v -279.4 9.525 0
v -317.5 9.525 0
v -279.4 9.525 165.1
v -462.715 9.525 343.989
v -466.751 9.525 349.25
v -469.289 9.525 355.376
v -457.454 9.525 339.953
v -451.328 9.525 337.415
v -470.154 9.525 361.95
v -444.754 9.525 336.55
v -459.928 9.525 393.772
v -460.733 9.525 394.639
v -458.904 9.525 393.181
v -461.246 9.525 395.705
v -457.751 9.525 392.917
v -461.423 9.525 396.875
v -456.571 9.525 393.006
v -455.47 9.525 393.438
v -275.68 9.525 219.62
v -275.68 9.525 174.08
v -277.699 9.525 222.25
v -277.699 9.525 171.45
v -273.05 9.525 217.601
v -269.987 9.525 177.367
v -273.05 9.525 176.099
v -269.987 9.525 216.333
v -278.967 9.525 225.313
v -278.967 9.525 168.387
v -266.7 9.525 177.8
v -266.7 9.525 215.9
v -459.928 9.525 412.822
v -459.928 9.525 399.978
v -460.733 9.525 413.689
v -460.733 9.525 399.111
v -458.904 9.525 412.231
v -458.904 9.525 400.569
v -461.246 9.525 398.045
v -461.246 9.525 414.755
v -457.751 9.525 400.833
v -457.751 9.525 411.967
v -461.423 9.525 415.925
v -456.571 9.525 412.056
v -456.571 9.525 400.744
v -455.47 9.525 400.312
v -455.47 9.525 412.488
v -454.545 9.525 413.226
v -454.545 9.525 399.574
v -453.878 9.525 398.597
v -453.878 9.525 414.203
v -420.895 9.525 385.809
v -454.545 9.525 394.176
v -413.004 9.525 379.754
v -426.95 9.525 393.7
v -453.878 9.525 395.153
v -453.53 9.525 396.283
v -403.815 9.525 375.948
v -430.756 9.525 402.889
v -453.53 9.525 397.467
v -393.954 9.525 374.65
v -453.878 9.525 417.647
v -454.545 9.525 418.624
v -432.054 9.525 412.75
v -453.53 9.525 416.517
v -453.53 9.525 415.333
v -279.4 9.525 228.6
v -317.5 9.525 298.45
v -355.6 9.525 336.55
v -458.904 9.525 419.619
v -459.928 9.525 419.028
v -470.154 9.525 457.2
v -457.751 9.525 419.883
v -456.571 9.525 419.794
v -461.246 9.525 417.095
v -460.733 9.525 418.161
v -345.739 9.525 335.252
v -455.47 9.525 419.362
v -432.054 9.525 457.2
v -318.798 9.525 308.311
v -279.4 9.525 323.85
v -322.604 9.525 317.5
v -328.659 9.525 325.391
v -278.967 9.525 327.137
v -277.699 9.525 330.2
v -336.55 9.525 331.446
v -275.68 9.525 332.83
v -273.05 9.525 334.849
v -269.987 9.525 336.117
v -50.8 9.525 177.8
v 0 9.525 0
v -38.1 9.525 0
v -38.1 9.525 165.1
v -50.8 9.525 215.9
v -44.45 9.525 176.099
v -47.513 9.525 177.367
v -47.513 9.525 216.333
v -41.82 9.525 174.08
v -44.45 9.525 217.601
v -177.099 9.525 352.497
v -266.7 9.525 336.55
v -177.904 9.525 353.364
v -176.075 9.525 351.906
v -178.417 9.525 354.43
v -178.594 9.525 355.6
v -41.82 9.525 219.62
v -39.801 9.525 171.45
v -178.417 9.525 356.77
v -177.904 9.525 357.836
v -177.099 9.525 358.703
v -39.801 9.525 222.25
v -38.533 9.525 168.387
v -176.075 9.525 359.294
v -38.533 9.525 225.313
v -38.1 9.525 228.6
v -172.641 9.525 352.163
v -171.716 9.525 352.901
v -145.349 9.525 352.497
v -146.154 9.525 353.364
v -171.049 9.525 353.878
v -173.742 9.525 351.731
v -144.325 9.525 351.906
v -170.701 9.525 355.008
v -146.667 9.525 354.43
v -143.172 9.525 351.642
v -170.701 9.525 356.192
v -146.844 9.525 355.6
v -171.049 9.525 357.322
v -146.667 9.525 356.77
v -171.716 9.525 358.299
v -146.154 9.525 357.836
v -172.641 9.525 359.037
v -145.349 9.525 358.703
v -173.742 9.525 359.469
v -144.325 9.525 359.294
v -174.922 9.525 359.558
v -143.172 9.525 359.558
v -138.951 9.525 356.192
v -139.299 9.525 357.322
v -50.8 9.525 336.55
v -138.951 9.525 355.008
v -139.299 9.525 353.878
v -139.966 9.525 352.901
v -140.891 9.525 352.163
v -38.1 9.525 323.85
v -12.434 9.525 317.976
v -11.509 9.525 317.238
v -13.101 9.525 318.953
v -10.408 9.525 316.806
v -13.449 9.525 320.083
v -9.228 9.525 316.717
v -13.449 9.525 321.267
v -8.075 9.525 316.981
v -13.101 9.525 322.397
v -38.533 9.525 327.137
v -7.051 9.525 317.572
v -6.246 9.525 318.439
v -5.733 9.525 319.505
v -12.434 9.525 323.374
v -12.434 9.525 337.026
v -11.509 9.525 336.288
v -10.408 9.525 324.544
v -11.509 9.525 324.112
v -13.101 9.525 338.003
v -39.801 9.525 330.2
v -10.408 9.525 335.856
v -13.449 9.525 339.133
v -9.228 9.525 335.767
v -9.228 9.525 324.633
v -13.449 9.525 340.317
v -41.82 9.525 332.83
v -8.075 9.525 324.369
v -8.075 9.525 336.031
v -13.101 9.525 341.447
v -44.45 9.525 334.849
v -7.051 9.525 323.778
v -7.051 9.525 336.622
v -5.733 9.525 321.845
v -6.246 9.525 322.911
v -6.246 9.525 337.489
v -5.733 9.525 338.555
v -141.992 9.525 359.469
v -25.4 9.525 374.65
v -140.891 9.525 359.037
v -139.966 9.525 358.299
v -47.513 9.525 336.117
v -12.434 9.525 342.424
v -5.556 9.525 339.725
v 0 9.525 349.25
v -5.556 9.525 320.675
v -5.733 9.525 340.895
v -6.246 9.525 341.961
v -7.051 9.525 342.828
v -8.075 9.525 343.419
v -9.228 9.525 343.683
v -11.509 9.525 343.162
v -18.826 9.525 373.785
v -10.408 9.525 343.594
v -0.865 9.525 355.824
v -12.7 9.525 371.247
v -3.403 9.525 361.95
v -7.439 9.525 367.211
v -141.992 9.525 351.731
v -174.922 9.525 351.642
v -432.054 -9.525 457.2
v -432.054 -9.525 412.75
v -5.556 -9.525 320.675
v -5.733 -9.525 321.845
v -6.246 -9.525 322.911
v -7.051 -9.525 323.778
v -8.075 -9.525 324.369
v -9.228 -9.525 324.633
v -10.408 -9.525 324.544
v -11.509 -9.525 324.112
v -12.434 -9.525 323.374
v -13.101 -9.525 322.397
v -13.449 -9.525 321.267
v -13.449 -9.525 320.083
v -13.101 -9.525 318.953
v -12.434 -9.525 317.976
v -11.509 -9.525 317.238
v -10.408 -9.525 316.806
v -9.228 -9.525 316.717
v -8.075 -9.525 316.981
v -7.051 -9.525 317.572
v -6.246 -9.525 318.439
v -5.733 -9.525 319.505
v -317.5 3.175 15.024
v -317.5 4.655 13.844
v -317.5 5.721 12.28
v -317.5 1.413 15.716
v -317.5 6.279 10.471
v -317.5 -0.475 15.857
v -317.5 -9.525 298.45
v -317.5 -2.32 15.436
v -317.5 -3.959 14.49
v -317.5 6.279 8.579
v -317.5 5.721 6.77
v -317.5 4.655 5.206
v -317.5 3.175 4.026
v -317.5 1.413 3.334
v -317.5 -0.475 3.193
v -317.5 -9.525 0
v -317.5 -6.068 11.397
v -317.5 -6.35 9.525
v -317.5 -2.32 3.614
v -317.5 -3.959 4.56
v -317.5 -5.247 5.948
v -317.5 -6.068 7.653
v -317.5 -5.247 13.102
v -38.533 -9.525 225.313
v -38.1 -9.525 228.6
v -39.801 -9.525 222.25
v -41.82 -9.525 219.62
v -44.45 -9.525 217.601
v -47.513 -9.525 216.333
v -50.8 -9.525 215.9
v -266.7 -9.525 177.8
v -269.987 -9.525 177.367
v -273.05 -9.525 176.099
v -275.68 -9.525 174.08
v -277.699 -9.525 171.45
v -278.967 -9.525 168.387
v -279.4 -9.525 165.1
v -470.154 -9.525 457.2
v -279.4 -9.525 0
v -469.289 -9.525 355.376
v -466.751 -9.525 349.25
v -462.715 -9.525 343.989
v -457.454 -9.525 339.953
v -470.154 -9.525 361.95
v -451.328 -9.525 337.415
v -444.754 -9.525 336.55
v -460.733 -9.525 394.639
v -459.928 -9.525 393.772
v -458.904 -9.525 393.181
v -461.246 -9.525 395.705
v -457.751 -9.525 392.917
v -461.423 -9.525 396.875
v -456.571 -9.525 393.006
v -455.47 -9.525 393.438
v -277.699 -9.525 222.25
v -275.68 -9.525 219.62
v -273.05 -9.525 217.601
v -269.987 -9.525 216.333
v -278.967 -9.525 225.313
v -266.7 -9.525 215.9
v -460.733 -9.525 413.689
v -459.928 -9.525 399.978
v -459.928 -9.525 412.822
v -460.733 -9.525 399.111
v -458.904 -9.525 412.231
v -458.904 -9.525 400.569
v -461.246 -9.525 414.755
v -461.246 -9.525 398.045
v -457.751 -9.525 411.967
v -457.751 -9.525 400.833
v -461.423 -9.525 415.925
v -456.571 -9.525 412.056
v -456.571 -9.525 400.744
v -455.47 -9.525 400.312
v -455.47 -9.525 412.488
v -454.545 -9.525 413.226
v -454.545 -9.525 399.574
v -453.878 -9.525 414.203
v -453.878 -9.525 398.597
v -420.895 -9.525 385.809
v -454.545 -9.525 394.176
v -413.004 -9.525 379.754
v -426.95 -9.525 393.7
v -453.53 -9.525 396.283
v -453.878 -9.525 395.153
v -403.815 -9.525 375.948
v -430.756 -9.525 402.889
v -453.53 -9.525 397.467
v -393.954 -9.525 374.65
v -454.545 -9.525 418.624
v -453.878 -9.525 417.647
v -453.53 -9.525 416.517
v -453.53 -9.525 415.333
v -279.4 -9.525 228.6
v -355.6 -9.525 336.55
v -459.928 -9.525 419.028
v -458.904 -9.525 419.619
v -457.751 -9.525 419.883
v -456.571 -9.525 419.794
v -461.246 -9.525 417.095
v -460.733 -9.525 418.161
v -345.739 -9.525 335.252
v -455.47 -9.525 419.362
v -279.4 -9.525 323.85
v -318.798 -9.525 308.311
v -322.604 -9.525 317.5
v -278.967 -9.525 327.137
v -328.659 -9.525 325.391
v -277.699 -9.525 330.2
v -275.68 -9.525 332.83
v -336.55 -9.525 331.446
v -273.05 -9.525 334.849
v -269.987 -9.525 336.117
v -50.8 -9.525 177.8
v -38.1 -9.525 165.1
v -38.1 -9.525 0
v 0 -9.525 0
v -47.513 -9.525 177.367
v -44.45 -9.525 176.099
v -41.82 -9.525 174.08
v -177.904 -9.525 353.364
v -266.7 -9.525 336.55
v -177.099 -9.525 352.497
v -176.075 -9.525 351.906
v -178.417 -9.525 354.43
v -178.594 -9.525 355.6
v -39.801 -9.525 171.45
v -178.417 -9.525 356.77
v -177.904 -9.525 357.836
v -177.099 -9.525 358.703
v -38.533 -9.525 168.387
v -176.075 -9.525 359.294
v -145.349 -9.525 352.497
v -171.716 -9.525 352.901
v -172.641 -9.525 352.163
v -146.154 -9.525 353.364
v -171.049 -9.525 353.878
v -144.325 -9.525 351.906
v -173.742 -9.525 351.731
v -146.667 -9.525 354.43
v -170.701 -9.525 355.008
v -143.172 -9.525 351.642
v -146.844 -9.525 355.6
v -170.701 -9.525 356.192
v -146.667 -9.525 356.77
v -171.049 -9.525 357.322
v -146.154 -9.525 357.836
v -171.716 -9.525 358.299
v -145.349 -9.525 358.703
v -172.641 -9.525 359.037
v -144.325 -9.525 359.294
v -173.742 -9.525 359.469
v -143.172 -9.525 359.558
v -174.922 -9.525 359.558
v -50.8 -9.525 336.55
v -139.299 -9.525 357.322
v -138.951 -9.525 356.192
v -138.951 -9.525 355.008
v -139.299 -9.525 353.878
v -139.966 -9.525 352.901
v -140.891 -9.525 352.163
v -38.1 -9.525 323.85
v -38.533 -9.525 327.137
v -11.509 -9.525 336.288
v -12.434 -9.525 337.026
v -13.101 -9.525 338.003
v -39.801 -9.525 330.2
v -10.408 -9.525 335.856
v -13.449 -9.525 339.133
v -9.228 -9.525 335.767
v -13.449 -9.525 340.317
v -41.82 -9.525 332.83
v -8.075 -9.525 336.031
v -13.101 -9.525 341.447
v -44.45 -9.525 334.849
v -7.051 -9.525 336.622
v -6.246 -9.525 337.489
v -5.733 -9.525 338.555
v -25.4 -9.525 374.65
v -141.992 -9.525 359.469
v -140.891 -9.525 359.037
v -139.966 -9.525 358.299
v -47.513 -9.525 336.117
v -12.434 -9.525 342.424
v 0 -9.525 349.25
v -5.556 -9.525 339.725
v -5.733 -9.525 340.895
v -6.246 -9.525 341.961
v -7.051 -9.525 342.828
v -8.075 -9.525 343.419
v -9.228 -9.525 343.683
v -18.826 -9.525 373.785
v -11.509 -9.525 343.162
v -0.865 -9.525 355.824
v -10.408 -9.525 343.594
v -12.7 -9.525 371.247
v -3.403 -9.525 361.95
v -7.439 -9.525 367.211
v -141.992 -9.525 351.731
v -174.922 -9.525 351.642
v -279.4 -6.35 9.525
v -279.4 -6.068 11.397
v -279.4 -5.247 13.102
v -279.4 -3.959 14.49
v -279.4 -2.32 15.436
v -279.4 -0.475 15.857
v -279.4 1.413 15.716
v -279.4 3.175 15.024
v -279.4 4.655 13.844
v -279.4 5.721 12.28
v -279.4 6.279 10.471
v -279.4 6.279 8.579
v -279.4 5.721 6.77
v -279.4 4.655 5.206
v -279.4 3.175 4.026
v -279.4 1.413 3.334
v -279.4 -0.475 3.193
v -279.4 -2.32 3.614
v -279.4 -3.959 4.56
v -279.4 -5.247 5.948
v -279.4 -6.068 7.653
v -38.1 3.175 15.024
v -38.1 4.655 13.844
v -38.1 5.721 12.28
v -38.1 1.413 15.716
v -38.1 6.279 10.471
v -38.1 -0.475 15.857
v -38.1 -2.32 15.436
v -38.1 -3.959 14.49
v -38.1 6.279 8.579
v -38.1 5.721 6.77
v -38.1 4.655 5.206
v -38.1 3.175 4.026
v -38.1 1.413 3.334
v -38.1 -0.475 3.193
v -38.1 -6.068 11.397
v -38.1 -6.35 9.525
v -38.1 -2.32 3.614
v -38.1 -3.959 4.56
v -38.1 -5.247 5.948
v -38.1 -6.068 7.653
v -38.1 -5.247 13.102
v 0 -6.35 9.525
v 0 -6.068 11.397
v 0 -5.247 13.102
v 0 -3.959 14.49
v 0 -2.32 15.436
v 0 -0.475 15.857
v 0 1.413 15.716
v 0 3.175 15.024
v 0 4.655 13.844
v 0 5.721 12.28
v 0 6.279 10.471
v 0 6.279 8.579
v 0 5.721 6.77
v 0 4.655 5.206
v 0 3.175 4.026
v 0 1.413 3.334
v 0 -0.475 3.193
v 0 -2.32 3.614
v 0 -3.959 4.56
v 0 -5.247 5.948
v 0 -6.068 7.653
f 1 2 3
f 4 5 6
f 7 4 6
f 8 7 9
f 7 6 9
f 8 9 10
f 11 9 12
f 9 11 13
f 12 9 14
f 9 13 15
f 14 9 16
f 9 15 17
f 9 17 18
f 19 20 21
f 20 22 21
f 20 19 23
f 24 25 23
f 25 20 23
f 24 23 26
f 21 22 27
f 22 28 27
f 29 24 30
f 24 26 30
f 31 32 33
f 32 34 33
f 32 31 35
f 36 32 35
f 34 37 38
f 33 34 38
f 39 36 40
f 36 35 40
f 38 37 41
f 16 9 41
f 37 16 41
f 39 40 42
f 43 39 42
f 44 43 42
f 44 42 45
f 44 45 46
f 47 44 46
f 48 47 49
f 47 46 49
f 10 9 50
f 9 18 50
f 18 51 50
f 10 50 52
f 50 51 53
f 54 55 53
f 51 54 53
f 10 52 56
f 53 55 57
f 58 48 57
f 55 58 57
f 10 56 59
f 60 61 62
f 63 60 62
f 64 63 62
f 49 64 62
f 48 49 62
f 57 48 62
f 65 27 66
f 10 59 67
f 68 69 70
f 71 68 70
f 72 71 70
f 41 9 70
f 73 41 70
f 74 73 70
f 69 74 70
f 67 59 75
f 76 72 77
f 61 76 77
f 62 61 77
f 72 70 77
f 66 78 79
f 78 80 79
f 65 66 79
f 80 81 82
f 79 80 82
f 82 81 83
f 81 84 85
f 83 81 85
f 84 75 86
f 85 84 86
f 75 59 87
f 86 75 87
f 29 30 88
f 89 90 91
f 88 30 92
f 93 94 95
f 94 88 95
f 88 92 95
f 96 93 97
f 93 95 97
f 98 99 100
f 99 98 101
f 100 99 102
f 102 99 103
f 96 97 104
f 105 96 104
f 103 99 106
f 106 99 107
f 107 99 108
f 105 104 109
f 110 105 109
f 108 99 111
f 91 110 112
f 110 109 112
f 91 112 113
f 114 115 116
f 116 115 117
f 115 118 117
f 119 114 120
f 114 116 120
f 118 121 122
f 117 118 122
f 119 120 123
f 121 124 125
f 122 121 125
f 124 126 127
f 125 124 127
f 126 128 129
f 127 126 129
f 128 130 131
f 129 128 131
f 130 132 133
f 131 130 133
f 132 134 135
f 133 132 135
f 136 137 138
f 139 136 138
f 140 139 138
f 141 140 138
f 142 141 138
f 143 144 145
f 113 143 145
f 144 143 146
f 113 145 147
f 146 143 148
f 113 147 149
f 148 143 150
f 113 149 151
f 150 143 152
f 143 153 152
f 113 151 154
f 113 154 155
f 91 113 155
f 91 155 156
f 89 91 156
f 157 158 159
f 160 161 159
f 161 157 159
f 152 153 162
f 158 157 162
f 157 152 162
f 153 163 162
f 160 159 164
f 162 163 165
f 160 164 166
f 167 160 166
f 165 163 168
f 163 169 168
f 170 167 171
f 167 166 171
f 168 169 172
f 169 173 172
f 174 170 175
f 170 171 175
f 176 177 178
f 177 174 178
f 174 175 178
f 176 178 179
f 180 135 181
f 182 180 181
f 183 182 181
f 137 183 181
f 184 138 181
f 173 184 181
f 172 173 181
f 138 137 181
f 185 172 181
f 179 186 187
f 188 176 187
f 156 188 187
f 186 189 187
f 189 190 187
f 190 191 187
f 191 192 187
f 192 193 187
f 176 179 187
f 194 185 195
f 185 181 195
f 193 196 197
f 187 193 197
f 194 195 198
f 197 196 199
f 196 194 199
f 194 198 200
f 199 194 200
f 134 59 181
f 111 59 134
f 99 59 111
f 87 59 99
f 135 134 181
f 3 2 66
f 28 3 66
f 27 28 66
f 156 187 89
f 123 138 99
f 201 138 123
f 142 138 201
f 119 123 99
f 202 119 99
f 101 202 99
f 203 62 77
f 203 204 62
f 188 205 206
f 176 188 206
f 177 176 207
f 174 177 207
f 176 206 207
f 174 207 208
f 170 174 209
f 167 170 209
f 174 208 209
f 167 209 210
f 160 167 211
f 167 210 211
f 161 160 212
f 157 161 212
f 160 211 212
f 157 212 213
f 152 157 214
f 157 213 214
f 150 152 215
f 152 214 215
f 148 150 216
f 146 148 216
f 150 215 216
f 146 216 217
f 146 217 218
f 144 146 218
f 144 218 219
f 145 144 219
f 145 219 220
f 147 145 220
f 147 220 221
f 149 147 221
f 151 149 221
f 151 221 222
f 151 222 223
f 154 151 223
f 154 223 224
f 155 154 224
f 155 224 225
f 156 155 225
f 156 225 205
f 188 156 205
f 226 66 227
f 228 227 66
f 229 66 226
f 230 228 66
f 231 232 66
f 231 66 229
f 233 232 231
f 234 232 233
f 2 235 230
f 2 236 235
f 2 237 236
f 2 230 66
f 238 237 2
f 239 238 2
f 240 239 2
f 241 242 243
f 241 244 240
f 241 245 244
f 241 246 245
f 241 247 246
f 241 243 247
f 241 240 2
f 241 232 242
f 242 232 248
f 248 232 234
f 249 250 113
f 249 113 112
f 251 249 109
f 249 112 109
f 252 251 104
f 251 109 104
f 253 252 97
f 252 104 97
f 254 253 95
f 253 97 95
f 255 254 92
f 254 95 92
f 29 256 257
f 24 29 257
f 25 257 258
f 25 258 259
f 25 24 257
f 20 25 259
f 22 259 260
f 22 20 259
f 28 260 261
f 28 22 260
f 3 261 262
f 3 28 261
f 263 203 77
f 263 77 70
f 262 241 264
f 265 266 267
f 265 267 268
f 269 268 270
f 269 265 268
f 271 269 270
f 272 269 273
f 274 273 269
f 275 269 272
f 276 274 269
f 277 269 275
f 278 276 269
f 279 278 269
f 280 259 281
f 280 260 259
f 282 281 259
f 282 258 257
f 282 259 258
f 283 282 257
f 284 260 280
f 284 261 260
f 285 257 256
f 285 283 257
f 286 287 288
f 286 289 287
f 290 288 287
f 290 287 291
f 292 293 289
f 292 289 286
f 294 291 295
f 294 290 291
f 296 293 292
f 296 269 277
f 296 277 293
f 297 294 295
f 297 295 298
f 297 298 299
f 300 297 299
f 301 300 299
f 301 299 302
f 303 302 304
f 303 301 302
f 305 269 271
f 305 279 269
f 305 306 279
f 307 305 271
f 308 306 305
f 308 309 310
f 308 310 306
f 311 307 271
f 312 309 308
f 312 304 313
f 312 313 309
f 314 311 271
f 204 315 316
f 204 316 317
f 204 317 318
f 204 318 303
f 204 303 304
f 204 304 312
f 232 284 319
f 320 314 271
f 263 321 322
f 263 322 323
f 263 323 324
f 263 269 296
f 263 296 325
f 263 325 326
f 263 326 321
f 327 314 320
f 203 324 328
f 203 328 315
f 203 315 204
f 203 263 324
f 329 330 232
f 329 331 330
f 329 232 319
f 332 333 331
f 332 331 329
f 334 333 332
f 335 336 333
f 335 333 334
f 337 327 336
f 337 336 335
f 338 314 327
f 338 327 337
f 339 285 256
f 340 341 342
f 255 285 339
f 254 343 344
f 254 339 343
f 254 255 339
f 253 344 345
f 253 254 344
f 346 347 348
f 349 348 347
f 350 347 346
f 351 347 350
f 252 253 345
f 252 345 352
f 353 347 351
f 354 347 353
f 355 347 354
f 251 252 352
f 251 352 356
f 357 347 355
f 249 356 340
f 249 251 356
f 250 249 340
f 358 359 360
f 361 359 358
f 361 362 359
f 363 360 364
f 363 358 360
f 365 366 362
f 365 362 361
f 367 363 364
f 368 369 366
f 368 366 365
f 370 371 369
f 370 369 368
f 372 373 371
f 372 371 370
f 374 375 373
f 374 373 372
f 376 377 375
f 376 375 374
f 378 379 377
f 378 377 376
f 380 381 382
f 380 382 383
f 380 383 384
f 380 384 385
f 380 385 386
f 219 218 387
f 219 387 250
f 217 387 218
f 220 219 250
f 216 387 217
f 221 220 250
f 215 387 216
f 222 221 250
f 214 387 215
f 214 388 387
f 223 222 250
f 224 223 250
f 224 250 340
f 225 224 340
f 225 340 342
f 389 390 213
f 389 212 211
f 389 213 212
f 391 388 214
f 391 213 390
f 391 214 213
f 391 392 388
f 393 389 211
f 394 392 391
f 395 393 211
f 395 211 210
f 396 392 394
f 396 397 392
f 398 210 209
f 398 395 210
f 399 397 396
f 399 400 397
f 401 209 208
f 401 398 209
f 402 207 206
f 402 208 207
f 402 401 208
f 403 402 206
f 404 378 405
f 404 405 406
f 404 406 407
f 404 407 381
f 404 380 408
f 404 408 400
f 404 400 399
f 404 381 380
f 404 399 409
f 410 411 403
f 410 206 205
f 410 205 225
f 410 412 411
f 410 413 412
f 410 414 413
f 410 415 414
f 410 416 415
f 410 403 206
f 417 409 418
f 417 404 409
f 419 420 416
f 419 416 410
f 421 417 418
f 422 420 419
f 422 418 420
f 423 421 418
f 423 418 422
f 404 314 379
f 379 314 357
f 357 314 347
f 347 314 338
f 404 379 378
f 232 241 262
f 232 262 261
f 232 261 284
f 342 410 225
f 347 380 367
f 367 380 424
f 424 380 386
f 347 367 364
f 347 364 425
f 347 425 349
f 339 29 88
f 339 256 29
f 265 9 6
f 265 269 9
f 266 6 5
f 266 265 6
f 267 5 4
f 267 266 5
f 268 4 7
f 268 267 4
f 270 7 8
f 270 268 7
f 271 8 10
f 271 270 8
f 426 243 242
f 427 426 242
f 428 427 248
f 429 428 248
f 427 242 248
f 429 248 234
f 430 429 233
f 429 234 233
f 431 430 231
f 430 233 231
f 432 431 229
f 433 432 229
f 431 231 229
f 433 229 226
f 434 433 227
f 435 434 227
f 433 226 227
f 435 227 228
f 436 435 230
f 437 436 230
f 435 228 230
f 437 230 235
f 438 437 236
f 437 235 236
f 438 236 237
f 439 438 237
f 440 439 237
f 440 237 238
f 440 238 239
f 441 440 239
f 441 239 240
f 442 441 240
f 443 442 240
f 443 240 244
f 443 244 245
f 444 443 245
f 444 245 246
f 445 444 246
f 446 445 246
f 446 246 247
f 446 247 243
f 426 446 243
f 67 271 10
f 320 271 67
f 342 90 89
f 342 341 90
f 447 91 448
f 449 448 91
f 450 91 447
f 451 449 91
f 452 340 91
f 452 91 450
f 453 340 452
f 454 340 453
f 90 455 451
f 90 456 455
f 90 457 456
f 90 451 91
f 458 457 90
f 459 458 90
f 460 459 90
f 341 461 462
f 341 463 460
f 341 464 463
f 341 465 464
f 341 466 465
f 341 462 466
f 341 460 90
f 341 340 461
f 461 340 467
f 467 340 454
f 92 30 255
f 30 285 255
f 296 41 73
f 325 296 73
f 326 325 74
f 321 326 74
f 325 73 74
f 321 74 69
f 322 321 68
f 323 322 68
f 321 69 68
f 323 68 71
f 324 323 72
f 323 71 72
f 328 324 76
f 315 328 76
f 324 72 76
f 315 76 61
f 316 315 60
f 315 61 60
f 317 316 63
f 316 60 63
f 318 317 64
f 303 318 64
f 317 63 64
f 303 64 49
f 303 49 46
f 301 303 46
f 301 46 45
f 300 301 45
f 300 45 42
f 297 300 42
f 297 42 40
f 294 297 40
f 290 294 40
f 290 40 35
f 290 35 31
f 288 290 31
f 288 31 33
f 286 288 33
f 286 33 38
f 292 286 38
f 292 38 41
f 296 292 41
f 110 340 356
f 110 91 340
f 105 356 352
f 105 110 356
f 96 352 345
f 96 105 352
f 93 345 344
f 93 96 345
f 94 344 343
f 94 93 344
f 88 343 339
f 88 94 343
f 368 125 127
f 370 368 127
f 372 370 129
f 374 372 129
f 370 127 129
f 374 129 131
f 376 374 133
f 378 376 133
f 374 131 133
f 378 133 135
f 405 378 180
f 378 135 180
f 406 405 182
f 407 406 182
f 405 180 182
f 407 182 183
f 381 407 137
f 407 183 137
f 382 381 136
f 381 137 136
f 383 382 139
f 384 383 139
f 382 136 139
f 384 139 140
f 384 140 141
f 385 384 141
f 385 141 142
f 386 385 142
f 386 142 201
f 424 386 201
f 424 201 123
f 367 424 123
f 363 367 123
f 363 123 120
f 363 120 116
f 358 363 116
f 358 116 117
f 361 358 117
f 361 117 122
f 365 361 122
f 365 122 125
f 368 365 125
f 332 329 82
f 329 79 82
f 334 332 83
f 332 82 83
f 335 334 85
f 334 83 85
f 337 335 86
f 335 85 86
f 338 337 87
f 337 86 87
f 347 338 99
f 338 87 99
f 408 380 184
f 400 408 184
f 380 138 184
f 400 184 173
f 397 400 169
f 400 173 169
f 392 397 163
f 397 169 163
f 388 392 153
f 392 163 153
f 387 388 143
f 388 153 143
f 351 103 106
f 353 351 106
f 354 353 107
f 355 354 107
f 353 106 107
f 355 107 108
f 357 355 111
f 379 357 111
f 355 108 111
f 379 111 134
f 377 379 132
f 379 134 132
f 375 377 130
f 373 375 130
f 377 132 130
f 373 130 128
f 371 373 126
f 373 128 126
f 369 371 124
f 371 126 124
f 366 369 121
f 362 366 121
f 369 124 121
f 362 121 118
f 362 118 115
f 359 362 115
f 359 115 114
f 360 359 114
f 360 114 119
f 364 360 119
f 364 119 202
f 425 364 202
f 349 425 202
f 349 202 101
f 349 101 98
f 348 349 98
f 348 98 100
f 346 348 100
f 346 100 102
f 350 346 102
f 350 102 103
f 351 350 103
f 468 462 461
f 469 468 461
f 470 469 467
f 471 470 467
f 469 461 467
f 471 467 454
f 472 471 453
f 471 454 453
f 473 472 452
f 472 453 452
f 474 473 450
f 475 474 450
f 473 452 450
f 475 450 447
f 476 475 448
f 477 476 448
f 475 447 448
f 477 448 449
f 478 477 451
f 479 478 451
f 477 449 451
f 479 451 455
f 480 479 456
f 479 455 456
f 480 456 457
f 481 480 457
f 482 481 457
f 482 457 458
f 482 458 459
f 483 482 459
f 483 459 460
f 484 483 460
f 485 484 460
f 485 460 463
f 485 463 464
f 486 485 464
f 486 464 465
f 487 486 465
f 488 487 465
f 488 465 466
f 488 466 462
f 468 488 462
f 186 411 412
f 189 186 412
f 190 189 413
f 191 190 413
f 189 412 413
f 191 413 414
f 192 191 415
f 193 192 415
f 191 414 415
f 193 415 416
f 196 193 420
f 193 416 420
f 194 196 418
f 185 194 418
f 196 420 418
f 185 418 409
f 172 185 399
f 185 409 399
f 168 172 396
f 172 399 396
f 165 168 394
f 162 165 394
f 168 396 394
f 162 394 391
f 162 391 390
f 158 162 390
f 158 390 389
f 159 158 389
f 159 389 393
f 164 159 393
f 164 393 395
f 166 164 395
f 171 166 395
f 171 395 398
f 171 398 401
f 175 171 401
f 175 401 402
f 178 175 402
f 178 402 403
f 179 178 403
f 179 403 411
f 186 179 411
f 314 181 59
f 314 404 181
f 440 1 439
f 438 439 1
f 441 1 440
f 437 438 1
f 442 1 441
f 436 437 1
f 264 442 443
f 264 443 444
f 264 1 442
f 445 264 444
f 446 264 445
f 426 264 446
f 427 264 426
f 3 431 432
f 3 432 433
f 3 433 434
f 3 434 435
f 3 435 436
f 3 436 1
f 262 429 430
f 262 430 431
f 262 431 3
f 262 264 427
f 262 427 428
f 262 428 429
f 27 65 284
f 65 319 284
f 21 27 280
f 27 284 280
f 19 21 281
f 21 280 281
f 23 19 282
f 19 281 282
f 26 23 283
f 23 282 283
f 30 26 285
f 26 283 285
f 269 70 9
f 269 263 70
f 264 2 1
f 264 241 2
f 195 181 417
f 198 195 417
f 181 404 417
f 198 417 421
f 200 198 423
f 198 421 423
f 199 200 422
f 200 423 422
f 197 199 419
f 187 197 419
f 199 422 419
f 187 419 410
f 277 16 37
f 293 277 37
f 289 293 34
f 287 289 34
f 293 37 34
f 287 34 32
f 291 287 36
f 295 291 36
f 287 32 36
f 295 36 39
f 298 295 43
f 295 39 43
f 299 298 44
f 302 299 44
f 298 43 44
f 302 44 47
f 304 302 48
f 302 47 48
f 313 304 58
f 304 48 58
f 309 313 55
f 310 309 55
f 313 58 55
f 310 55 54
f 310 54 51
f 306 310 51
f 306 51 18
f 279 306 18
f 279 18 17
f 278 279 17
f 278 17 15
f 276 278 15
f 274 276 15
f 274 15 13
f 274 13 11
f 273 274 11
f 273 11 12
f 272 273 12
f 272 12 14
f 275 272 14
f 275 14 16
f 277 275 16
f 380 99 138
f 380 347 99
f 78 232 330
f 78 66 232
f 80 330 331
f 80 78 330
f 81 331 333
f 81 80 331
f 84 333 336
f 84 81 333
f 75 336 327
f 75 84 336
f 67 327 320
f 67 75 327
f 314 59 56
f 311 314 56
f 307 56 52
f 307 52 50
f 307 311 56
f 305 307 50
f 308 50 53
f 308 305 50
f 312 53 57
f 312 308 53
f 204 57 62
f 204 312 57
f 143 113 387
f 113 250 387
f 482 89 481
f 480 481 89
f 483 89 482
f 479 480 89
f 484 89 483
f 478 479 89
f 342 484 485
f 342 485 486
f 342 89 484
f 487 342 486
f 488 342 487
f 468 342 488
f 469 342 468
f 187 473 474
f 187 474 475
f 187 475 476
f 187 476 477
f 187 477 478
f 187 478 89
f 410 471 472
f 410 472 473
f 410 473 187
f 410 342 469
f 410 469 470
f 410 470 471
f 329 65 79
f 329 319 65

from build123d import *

# Parameters (mm, degrees)
F0_W     = 241.3
F0_H     = 120.65
F1_DEPTH = 9.525
F2_R     = 12.7
F3_R     = 38.1
F5_D     = 12.7
F6_R     = 25.4
F8_D     = 7.9375
F10_D    = 7.9375
F12_D    = 7.9375


# Not quite as in the source:
# - a length typed as a fraction of an inch, garbled in the dataset ("3 / 203.2 mm" for 3/8 in), is restored


with BuildPart() as f1:
    # F0 (on Front) → F1 (new body, symmetric)
    with BuildSketch(Plane.XZ):
        Polygon((-38.1, 0), (0, 0), (0, 374.65), (-432.054, 374.65), (-432.054, 457.2), (-470.154, 457.2), (-470.154, 336.55), (-317.5, 336.55), (-317.5, 0), (-279.4, 0), (-279.4, 177.8), (-38.1, 177.8), align=None)
        with Locations((-158.75, 276.225)):
            Rectangle(F0_W, F0_H, mode=Mode.SUBTRACT)
    extrude(amount=F1_DEPTH, both=True)

    # F2
    f2_edges = [f1.edges().sort_by_distance(p)[0] for p in [
        (-279.4, 0, 336.55),
        (-279.4, 0, 215.9),
        (-38.1, 0, 215.9),
        (-38.1, 0, 336.55),
        (-279.4, 0, 177.8),
        (-38.1, 0, 177.8),
    ]]
    fillet(f2_edges, radius=F2_R)

    # F3
    f3_edges = [f1.edges().sort_by_distance(p)[0] for p in [
        (-317.5, 0, 336.55),
        (-432.054, 0, 374.65),
    ]]
    fillet(f3_edges, radius=F3_R)

    # F5 (through all)
    with Locations(Plane.YZ):
        with Locations((0, 9.525)):
            Hole(F5_D / 2)

    # F6
    f6_edges = [f1.edges().sort_by_distance(p)[0] for p in [
        (-470.154, 0, 336.55),
        (0, 0, 374.65),
    ]]
    fillet(f6_edges, radius=F6_R)

    # F8 (through all)
    with Locations(Plane.XZ.offset(9.525)):
        with Locations((-174.625, 355.6), (-142.875, 355.6)):
            Hole(F8_D / 2)

    # F10 (through all)
    with Locations(Plane(origin=(0, 9.525, 0), x_dir=(-1, 0, 0), z_dir=(0, 1, 0))):
        with Locations((9.525, 320.675), (9.525, 339.725)):
            Hole(F10_D / 2)

    # F12 (through all)
    with Locations(Plane.XZ.offset(9.525)):
        with Locations((-457.454, 415.925), (-457.454, 396.875)):
            Hole(F12_D / 2)


solid = f1.part
